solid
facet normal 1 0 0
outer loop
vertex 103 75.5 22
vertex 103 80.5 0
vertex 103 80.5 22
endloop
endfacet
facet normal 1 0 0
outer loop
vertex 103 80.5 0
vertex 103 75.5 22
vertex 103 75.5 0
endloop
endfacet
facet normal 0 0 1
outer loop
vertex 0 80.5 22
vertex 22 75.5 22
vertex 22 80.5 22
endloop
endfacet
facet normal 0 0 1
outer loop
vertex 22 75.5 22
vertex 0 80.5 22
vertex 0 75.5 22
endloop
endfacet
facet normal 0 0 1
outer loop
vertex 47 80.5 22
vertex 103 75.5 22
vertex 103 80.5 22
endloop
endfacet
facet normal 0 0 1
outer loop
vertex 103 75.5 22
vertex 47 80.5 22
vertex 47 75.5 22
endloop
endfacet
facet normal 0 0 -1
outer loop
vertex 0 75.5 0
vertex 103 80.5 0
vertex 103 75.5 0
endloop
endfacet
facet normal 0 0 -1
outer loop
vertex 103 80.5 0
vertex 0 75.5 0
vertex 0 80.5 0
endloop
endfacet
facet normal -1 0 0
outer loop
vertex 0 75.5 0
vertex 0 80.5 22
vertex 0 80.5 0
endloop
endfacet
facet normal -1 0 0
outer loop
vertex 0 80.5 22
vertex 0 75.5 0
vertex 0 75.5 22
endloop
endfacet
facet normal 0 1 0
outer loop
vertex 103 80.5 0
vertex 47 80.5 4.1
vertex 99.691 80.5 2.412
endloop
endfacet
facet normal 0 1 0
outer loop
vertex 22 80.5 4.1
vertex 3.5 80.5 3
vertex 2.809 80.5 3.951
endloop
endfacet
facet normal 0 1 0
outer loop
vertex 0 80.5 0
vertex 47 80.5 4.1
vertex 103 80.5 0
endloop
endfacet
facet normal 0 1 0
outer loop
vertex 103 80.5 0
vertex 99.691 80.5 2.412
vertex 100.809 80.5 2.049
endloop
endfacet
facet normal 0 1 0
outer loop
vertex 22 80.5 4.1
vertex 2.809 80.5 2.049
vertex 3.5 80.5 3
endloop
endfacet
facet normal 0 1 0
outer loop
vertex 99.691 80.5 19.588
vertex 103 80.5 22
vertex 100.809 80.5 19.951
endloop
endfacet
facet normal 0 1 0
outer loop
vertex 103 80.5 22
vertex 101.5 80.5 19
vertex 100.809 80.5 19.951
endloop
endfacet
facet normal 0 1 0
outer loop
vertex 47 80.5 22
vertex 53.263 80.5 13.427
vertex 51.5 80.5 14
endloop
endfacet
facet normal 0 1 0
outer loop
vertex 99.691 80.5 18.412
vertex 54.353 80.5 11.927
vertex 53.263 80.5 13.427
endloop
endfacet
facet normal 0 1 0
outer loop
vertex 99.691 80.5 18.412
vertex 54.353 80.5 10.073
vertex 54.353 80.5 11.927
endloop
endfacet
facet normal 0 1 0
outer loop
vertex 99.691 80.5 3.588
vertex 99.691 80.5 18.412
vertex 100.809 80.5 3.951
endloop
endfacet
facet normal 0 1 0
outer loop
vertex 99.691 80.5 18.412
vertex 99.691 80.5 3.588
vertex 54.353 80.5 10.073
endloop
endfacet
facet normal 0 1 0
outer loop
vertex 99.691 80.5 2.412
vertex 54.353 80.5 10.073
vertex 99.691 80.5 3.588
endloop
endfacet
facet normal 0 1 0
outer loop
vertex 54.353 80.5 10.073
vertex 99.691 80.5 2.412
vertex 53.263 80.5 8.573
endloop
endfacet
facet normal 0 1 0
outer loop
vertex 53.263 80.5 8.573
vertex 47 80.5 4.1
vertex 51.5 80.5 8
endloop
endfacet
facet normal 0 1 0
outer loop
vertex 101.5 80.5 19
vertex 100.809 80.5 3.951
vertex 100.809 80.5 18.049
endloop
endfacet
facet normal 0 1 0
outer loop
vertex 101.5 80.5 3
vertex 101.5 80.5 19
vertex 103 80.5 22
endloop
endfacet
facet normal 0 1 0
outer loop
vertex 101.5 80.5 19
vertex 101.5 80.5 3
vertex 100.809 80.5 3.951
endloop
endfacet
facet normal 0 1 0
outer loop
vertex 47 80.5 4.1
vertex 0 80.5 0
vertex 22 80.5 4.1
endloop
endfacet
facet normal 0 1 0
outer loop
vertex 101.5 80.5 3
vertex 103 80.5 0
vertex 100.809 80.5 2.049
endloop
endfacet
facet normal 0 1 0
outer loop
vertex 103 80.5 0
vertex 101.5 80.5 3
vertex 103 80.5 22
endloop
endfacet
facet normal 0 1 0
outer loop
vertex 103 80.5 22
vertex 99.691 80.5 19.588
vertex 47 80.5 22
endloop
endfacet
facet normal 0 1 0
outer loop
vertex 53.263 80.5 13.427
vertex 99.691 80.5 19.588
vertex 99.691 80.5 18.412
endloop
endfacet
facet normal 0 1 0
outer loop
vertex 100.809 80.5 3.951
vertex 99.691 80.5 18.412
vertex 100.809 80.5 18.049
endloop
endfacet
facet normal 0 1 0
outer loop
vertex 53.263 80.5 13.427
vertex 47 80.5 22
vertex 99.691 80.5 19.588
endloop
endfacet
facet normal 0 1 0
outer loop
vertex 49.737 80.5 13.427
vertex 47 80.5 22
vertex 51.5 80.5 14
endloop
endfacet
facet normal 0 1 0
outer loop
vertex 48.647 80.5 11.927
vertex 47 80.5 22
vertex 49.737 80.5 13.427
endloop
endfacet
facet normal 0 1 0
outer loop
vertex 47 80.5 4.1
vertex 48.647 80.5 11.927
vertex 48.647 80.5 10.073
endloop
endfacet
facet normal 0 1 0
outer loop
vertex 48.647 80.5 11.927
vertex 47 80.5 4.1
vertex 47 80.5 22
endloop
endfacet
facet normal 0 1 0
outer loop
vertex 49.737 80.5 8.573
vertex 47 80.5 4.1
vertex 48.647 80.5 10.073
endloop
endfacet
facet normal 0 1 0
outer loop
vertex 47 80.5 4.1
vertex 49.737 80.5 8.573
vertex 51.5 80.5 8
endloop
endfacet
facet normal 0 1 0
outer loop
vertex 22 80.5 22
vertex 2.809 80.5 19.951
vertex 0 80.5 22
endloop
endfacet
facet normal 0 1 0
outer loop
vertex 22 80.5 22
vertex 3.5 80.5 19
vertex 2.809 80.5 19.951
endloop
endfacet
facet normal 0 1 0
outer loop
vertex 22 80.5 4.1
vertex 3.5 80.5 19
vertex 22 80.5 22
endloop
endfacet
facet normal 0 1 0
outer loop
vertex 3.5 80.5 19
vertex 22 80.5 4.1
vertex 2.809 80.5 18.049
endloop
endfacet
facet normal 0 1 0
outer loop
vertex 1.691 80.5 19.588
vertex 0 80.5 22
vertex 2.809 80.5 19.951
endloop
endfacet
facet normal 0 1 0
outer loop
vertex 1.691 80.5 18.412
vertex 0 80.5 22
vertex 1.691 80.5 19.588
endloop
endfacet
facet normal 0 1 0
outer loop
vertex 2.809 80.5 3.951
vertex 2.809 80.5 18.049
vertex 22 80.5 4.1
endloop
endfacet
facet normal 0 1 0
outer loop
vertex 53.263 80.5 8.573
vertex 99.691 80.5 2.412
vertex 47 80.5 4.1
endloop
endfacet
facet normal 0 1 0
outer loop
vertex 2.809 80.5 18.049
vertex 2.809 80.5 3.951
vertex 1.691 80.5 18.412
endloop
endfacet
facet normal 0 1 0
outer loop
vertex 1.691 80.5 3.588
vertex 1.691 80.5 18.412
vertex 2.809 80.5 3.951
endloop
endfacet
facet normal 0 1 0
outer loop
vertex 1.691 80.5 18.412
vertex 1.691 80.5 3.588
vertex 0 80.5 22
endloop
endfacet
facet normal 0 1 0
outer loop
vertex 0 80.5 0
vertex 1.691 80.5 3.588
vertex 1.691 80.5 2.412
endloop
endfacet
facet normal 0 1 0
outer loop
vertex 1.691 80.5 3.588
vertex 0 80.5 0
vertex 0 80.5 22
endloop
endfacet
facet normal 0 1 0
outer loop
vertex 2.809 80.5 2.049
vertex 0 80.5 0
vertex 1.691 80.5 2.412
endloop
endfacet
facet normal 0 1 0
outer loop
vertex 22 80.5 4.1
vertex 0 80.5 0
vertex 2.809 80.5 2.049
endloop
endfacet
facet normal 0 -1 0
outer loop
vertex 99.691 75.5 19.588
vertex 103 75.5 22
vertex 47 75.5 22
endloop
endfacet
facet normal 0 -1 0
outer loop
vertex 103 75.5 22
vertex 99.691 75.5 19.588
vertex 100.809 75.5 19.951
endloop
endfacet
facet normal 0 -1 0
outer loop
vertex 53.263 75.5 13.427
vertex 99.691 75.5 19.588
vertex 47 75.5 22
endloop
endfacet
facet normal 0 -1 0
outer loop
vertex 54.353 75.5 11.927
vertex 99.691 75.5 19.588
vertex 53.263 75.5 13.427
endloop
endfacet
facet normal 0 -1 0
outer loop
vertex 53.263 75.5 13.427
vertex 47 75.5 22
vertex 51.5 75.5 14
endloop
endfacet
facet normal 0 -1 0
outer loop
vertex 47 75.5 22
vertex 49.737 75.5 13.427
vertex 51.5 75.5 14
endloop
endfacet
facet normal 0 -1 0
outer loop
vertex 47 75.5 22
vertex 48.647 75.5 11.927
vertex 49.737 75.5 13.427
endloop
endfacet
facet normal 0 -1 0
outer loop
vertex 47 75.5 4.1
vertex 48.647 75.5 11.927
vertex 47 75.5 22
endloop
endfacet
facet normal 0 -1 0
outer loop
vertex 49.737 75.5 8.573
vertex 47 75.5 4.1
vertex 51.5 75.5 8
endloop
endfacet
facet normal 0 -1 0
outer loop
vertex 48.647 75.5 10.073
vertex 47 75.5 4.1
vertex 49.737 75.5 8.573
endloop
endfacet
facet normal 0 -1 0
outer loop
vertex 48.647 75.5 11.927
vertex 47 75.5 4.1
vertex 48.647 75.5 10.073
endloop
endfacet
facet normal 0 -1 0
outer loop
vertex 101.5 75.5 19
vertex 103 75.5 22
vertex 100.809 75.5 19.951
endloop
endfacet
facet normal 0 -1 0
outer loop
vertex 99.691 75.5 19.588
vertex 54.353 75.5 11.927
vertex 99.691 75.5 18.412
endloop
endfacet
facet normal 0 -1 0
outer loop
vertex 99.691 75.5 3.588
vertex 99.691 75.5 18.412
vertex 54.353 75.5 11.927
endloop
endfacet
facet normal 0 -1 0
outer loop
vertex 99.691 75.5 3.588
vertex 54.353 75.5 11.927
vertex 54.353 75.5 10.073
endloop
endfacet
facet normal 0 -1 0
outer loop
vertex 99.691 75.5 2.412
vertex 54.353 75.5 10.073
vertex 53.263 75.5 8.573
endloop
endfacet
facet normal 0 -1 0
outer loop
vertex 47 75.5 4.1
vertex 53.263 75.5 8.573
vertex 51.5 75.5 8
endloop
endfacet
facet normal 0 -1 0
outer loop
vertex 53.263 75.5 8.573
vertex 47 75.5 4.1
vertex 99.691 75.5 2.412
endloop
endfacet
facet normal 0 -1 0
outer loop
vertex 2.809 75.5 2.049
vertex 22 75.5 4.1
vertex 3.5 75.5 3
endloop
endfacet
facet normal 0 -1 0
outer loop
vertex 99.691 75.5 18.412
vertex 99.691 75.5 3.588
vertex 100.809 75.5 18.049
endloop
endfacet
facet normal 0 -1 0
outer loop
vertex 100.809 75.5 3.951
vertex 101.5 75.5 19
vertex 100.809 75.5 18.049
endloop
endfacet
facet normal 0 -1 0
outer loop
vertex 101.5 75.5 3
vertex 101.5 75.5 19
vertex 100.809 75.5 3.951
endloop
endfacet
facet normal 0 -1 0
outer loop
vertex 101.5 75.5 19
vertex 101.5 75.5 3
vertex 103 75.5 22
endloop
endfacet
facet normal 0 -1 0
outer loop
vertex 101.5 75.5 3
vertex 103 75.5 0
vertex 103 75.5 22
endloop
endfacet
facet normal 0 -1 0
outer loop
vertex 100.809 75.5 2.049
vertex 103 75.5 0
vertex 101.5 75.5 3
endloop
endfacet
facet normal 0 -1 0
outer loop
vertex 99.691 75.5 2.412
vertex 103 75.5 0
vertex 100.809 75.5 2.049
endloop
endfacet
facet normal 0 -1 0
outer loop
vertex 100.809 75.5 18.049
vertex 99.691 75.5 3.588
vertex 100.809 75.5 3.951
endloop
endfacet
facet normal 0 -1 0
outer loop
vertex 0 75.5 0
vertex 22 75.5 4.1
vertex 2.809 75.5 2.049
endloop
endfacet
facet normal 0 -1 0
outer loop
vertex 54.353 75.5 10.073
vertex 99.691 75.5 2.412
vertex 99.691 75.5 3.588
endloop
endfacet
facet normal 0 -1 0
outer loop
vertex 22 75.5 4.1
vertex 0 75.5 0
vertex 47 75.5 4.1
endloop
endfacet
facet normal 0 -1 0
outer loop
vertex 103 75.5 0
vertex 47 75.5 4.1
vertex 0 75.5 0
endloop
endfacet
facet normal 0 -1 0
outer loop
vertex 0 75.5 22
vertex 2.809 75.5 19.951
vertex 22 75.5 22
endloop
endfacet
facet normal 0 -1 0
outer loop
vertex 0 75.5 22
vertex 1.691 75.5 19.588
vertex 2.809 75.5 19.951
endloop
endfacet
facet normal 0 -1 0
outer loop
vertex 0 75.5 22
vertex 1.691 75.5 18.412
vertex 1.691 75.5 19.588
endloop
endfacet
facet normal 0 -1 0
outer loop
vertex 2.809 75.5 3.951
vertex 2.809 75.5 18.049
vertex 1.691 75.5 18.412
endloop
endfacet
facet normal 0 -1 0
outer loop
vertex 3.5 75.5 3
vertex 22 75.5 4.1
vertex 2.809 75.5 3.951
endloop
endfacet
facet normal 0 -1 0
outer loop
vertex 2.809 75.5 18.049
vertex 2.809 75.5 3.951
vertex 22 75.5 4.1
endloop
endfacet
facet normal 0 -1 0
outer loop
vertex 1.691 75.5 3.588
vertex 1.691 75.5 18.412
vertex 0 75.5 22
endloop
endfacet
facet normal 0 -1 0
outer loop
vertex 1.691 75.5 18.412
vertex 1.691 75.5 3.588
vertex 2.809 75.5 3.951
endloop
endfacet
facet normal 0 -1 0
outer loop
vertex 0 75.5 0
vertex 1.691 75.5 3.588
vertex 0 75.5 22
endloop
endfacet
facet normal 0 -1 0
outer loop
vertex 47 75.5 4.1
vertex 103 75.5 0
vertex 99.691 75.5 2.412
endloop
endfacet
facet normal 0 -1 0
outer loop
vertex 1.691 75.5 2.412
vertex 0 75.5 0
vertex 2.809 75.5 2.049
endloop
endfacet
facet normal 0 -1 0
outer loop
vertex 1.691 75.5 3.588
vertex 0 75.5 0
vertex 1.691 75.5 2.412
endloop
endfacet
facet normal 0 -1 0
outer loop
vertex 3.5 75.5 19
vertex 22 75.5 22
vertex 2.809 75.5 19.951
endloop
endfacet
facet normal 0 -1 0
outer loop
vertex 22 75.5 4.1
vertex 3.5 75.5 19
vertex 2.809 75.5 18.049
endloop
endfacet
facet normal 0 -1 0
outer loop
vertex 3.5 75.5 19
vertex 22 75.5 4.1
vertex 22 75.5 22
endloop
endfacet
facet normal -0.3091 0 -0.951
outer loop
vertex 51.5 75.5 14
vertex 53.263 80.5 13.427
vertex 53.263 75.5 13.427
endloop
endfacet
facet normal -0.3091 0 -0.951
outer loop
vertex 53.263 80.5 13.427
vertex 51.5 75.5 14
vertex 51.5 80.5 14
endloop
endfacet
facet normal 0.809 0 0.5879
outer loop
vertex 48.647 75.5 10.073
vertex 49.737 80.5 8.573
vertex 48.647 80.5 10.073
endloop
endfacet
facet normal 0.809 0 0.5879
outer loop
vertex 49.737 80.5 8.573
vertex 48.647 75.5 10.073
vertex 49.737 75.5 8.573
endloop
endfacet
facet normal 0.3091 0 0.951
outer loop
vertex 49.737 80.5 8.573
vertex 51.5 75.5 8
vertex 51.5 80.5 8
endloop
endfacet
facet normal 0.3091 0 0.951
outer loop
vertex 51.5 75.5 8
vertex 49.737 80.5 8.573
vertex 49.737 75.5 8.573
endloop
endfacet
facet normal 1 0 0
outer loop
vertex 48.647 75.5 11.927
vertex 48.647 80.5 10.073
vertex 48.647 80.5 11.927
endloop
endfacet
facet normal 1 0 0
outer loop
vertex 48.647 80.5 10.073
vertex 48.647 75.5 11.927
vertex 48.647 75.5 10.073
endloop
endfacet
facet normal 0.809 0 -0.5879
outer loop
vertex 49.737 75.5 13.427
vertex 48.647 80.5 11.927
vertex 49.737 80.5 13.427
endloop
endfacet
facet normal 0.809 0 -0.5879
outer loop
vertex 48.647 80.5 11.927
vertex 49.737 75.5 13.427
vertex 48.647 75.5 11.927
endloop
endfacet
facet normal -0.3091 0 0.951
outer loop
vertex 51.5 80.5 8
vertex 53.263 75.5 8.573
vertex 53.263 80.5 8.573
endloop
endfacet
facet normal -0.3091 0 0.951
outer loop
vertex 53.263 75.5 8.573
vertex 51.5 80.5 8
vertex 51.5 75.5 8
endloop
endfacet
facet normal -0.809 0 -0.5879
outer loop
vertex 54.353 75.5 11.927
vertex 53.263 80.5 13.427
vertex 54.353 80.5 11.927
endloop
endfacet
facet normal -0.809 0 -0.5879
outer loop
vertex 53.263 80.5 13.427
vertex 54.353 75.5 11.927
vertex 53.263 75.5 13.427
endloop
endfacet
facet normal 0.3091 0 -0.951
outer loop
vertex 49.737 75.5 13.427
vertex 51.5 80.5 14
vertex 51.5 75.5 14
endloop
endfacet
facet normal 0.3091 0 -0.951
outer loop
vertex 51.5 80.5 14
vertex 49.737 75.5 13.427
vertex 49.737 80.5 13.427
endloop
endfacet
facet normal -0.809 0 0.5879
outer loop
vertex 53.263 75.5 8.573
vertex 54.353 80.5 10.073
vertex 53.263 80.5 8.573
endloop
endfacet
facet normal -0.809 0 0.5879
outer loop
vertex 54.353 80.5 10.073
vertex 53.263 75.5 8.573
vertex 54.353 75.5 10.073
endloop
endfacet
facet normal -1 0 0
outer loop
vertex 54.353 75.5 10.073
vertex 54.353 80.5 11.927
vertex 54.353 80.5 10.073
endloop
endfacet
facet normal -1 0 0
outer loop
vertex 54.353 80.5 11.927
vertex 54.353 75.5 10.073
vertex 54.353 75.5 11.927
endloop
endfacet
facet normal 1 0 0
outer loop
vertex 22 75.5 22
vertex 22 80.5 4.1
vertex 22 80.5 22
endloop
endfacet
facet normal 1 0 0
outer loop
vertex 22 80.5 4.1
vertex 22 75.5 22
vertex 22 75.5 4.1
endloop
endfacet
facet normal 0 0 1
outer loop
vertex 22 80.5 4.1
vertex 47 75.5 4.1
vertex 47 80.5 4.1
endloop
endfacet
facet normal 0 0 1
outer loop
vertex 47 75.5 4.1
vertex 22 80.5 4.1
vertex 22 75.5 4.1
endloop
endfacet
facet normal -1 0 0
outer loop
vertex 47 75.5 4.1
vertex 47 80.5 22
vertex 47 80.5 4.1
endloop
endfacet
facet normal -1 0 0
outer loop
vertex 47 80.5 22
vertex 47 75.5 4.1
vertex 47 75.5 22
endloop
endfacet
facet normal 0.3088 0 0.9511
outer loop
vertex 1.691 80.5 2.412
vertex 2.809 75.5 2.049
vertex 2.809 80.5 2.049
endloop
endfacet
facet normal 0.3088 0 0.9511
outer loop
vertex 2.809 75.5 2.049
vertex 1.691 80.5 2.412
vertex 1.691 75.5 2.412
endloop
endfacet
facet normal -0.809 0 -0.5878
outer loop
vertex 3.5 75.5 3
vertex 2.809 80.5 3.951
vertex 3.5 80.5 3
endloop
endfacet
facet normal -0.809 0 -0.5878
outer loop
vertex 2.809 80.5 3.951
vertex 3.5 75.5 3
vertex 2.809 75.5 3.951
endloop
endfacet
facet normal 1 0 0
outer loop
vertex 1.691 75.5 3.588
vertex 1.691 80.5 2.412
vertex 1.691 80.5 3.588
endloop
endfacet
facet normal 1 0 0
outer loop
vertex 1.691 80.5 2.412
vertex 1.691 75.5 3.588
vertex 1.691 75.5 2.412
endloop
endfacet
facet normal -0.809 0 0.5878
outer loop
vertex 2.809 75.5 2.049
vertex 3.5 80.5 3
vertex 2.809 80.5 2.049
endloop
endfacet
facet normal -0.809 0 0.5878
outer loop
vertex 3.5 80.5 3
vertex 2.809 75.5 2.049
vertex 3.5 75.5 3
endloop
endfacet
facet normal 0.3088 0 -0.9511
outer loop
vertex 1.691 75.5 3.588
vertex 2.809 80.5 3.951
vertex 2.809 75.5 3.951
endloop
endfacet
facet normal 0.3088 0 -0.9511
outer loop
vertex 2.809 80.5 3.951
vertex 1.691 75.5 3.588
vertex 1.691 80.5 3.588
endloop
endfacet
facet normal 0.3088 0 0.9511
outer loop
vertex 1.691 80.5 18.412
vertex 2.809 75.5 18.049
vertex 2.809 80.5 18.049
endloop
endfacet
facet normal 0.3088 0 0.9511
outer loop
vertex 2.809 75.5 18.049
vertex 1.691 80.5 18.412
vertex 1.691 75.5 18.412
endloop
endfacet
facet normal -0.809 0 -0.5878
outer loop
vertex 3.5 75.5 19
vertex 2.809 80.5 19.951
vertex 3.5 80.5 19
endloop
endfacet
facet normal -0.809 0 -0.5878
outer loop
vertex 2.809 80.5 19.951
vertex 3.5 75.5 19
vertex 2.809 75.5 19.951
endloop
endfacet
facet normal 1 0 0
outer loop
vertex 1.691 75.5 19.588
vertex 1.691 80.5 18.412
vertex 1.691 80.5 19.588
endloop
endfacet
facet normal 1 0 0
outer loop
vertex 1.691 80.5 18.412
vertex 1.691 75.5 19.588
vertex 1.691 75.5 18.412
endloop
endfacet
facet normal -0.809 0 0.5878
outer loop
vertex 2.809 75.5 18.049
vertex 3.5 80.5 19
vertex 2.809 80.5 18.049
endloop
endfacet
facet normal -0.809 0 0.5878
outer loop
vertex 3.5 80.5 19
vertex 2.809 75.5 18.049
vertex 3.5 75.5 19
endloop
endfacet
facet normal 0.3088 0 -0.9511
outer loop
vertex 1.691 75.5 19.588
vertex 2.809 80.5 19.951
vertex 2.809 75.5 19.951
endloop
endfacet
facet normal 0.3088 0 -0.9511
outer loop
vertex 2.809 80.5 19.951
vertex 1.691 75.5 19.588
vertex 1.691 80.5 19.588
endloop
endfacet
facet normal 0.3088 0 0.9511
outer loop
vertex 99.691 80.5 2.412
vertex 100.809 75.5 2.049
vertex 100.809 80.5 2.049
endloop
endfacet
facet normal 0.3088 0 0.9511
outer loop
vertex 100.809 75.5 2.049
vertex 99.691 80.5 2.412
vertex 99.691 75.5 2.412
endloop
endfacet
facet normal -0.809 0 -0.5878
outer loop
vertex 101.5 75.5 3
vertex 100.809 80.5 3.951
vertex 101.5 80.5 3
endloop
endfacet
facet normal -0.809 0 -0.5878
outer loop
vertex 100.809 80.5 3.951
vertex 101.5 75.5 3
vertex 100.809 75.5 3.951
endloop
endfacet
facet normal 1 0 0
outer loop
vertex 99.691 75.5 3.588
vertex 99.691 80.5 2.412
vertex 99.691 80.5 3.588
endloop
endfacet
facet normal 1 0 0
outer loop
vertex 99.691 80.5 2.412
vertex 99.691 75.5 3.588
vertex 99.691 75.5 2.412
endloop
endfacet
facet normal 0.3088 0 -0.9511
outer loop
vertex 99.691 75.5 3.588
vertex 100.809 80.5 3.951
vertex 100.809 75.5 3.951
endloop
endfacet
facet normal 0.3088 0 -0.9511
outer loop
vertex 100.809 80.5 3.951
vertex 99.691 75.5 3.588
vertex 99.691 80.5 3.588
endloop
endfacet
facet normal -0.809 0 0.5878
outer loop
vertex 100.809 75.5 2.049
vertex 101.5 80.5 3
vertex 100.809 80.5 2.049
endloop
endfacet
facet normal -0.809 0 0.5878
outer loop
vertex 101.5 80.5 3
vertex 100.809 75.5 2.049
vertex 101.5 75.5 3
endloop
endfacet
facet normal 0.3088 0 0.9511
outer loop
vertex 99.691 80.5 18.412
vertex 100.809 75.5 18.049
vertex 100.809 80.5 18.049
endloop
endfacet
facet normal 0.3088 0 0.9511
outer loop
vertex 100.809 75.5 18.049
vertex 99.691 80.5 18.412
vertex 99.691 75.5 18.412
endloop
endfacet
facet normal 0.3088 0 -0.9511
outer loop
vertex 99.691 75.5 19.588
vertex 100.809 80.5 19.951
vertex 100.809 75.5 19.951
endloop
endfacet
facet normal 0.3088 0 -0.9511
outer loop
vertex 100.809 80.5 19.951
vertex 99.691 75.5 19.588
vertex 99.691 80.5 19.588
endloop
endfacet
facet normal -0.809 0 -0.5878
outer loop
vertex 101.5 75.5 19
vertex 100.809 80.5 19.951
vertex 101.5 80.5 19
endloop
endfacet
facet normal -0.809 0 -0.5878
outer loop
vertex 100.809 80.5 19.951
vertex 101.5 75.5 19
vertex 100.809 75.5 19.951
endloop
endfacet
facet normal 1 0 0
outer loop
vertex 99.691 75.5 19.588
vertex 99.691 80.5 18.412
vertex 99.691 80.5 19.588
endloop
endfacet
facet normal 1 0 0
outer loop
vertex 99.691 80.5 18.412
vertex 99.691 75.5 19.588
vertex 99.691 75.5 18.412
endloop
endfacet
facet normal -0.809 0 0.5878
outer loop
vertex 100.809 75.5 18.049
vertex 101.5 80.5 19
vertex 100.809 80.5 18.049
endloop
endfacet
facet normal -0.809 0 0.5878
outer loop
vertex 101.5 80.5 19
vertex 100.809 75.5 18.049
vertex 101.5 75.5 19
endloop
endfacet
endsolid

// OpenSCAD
// file: servo.scad
include <variables.scad>

// Cutout for servo body
module servoCutout(thickness) {
    cube([servoWidth, servoHeight, thickness]);
}

// Cutout for servo mounting plate
module servoPlateCutout() {
    cylinder(h = servoPlateThickness + DIFFERENCE_FIX_2, r = servoPlateRadius);
}
// file: frame.scad
include <variables.scad>

use <servo.scad>

// Frame
module frame() {
    difference() {
        frameBody();
        frameServoPlateCutout();
        frameHoleTop();
        frameShutterCutout();
        frameServoCutout();
        frameScrewHole(frameThickness / 2, frameScrewHoleOffsetZ);
        frameScrewHole(frameThickness / 2, frameDepth - frameScrewHoleOffsetZ);
        frameScrewHole(frameWidth - frameThickness / 2, frameScrewHoleOffsetZ);
        frameScrewHole(frameWidth - frameThickness / 2, frameDepth - frameScrewHoleOffsetZ);
    }

    framePinRight();
}

// Frame body
module frameBody() {
    difference() {
        // Frame
        cube([
            frameWidth,
            frameHeight,
            frameDepth
        ]);

        // Frame cutout
        translate([frameThickness, frameThickness, DIFFERENCE_FIX_NEGATIVE])
        cube([
            frameWidth - 2 * frameThickness,
            frameHeight - 2 * frameThickness,
            frameDepth + DIFFERENCE_FIX_2
        ]);
    }
}

// Cutout for support servo mounting plate
module frameServoPlateCutout() {
    translate([DIFFERENCE_FIX_NEGATIVE, frameHeight / 2, frameDepth / 2])
    rotate([0, 90, 0])
    servoPlateCutout();
}

// Cutout for servo
module frameServoCutout() {
    translate([
        frameWidth / 2 - servoHeight / 2 - servoOffsetTop,
        DIFFERENCE_FIX_NEGATIVE,
        frameDepth / 2 - servoWidth / 2
    ])
    rotate([270, 270, 0])
    servoCutout(frameThickness + DIFFERENCE_FIX_2);
}

// Pin for right support
module framePinRight() {
    translate([frameWidth, frameHeight / 2, frameDepth / 2])
    rotate([0, 90, 0])
    union() {
        cylinder(h = supportThickness + framePinOffsetHeight, r = supportRightHoleRadius - framePinRadiusOffset);
        cylinder(h = framePinOffsetHeight, r = framePinOffsetRadius);
    }
}

// Hole in the top for camera mount pin
module frameHoleTop() {
    translate([frameWidth / 2, frameHeight - frameThickness - DIFFERENCE_FIX, frameDepth / 2])
    rotate([0, 90, 90])
    cylinder(h = frameThickness + DIFFERENCE_FIX_2, r = frameHoleTopRadius);
}

// Cutout for shutter
module frameShutterCutout() {
    translate([frameShutterCutoutOffsetX, frameHeight + DIFFERENCE_FIX, frameDepth - frameShutterCutoutHeight + DIFFERENCE_FIX])
    rotate([90, 0, 0])
    cube([frameShutterCutoutWidth, frameShutterCutoutHeight + DIFFERENCE_FIX_2, frameThickness + DIFFERENCE_FIX_2]);
}

// Screw hole for top part of frame
module frameScrewHole(offsetX, offsetZ) {
    translate([offsetX, frameHeight + DIFFERENCE_FIX, offsetZ])
    rotate([90, 0, 0])
    cylinder(h = frameScrewHoleHeight + DIFFERENCE_FIX, r = frameScrewHoleRadius);
}

frame();
// file: variables.scad
// General
DIFFERENCE_FIX = 0.1;
DIFFERENCE_FIX_NEGATIVE = -1 * DIFFERENCE_FIX;
DIFFERENCE_FIX_2 = 2 * DIFFERENCE_FIX;

componentThickness = 5;

// Servo cutout
servoWidth = 12;
servoHeight = 23.5;
servoOffsetTop = 6;
servoFlangeDistance = 12.5;

// Servo mounting plate
servoPlateRadius = 10;
servoPlateThickness = 1.6;

// Support
supportThickness = 8;
supportHoleHeight = 50;
supportWidth = 50;
supportTaper = 12;
supportBaseDepth = 15;
supportMountingHoleRadius = 2;

// Support right
supportRightHoleRadius = 3;

// Camera mount
cameraMountGoproWidth = 63;
cameraMountGoproHeight = 45;
cameraMountGoproDepth = 25;

cameraMountThickness = componentThickness;
cameraMountWidth = cameraMountGoproWidth + 2 * cameraMountThickness;
cameraMountHeight = cameraMountGoproHeight + 2 * cameraMountThickness;
cameraMountDepth = cameraMountGoproDepth + cameraMountThickness;

cameraMountShutterCutoutWidth = 13;
cameraMountShutterCutoutOffsetX = 8;
cameraMountShutterCutoutOffsetZ = 6;
cameraMountShutterCutoutGap = componentThickness;

cameraMountPowerCutoutDepth = 10;
cameraMountPowerCutoutHeight = 9;
cameraMountPowerCutoutOffsetY = 9;
cameraMountPowerCutoutOffsetZ = 7;
cameraMountPowerCutoutGap = componentThickness;

cameraMountBackCutoutOffset = 8;

cameraMountPinOffsetRadius = supportRightHoleRadius + 2;
cameraMountPinOffsetHeight = 2;
cameraMountPinRadiusOffset = 0.1;

// Frame
framePinOffsetRadius = cameraMountPinOffsetRadius;
framePinOffsetHeight = cameraMountPinOffsetHeight;
framePinRadiusOffset = cameraMountPinRadiusOffset;

frameCameraMountOffsetX = 10;
frameThickness = componentThickness;
frameWidth = cameraMountWidth + 2 * frameThickness + 2 * frameCameraMountOffsetX;
frameHeight = cameraMountHeight + 2 * frameThickness + servoFlangeDistance + framePinOffsetHeight + 1;
frameDepth = 22;
frameHoleTopRadius = supportRightHoleRadius;

frameShutterCutoutWidth = 25;
frameShutterCutoutHeight = 18;
frameShutterCutoutOffsetX = 22;

frameScrewHoleHeight = 20;
frameScrewHoleRadius = 1;
frameScrewHoleOffsetZ = 3;
// main file
include <variables.scad>

use <frame.scad>

// Frame Top
module frameTop() {
    difference() {
        frame();

        cube([frameWidth + framePinOffsetHeight + supportThickness, frameHeight - frameThickness, frameDepth]);
    }
}

frameTop();
